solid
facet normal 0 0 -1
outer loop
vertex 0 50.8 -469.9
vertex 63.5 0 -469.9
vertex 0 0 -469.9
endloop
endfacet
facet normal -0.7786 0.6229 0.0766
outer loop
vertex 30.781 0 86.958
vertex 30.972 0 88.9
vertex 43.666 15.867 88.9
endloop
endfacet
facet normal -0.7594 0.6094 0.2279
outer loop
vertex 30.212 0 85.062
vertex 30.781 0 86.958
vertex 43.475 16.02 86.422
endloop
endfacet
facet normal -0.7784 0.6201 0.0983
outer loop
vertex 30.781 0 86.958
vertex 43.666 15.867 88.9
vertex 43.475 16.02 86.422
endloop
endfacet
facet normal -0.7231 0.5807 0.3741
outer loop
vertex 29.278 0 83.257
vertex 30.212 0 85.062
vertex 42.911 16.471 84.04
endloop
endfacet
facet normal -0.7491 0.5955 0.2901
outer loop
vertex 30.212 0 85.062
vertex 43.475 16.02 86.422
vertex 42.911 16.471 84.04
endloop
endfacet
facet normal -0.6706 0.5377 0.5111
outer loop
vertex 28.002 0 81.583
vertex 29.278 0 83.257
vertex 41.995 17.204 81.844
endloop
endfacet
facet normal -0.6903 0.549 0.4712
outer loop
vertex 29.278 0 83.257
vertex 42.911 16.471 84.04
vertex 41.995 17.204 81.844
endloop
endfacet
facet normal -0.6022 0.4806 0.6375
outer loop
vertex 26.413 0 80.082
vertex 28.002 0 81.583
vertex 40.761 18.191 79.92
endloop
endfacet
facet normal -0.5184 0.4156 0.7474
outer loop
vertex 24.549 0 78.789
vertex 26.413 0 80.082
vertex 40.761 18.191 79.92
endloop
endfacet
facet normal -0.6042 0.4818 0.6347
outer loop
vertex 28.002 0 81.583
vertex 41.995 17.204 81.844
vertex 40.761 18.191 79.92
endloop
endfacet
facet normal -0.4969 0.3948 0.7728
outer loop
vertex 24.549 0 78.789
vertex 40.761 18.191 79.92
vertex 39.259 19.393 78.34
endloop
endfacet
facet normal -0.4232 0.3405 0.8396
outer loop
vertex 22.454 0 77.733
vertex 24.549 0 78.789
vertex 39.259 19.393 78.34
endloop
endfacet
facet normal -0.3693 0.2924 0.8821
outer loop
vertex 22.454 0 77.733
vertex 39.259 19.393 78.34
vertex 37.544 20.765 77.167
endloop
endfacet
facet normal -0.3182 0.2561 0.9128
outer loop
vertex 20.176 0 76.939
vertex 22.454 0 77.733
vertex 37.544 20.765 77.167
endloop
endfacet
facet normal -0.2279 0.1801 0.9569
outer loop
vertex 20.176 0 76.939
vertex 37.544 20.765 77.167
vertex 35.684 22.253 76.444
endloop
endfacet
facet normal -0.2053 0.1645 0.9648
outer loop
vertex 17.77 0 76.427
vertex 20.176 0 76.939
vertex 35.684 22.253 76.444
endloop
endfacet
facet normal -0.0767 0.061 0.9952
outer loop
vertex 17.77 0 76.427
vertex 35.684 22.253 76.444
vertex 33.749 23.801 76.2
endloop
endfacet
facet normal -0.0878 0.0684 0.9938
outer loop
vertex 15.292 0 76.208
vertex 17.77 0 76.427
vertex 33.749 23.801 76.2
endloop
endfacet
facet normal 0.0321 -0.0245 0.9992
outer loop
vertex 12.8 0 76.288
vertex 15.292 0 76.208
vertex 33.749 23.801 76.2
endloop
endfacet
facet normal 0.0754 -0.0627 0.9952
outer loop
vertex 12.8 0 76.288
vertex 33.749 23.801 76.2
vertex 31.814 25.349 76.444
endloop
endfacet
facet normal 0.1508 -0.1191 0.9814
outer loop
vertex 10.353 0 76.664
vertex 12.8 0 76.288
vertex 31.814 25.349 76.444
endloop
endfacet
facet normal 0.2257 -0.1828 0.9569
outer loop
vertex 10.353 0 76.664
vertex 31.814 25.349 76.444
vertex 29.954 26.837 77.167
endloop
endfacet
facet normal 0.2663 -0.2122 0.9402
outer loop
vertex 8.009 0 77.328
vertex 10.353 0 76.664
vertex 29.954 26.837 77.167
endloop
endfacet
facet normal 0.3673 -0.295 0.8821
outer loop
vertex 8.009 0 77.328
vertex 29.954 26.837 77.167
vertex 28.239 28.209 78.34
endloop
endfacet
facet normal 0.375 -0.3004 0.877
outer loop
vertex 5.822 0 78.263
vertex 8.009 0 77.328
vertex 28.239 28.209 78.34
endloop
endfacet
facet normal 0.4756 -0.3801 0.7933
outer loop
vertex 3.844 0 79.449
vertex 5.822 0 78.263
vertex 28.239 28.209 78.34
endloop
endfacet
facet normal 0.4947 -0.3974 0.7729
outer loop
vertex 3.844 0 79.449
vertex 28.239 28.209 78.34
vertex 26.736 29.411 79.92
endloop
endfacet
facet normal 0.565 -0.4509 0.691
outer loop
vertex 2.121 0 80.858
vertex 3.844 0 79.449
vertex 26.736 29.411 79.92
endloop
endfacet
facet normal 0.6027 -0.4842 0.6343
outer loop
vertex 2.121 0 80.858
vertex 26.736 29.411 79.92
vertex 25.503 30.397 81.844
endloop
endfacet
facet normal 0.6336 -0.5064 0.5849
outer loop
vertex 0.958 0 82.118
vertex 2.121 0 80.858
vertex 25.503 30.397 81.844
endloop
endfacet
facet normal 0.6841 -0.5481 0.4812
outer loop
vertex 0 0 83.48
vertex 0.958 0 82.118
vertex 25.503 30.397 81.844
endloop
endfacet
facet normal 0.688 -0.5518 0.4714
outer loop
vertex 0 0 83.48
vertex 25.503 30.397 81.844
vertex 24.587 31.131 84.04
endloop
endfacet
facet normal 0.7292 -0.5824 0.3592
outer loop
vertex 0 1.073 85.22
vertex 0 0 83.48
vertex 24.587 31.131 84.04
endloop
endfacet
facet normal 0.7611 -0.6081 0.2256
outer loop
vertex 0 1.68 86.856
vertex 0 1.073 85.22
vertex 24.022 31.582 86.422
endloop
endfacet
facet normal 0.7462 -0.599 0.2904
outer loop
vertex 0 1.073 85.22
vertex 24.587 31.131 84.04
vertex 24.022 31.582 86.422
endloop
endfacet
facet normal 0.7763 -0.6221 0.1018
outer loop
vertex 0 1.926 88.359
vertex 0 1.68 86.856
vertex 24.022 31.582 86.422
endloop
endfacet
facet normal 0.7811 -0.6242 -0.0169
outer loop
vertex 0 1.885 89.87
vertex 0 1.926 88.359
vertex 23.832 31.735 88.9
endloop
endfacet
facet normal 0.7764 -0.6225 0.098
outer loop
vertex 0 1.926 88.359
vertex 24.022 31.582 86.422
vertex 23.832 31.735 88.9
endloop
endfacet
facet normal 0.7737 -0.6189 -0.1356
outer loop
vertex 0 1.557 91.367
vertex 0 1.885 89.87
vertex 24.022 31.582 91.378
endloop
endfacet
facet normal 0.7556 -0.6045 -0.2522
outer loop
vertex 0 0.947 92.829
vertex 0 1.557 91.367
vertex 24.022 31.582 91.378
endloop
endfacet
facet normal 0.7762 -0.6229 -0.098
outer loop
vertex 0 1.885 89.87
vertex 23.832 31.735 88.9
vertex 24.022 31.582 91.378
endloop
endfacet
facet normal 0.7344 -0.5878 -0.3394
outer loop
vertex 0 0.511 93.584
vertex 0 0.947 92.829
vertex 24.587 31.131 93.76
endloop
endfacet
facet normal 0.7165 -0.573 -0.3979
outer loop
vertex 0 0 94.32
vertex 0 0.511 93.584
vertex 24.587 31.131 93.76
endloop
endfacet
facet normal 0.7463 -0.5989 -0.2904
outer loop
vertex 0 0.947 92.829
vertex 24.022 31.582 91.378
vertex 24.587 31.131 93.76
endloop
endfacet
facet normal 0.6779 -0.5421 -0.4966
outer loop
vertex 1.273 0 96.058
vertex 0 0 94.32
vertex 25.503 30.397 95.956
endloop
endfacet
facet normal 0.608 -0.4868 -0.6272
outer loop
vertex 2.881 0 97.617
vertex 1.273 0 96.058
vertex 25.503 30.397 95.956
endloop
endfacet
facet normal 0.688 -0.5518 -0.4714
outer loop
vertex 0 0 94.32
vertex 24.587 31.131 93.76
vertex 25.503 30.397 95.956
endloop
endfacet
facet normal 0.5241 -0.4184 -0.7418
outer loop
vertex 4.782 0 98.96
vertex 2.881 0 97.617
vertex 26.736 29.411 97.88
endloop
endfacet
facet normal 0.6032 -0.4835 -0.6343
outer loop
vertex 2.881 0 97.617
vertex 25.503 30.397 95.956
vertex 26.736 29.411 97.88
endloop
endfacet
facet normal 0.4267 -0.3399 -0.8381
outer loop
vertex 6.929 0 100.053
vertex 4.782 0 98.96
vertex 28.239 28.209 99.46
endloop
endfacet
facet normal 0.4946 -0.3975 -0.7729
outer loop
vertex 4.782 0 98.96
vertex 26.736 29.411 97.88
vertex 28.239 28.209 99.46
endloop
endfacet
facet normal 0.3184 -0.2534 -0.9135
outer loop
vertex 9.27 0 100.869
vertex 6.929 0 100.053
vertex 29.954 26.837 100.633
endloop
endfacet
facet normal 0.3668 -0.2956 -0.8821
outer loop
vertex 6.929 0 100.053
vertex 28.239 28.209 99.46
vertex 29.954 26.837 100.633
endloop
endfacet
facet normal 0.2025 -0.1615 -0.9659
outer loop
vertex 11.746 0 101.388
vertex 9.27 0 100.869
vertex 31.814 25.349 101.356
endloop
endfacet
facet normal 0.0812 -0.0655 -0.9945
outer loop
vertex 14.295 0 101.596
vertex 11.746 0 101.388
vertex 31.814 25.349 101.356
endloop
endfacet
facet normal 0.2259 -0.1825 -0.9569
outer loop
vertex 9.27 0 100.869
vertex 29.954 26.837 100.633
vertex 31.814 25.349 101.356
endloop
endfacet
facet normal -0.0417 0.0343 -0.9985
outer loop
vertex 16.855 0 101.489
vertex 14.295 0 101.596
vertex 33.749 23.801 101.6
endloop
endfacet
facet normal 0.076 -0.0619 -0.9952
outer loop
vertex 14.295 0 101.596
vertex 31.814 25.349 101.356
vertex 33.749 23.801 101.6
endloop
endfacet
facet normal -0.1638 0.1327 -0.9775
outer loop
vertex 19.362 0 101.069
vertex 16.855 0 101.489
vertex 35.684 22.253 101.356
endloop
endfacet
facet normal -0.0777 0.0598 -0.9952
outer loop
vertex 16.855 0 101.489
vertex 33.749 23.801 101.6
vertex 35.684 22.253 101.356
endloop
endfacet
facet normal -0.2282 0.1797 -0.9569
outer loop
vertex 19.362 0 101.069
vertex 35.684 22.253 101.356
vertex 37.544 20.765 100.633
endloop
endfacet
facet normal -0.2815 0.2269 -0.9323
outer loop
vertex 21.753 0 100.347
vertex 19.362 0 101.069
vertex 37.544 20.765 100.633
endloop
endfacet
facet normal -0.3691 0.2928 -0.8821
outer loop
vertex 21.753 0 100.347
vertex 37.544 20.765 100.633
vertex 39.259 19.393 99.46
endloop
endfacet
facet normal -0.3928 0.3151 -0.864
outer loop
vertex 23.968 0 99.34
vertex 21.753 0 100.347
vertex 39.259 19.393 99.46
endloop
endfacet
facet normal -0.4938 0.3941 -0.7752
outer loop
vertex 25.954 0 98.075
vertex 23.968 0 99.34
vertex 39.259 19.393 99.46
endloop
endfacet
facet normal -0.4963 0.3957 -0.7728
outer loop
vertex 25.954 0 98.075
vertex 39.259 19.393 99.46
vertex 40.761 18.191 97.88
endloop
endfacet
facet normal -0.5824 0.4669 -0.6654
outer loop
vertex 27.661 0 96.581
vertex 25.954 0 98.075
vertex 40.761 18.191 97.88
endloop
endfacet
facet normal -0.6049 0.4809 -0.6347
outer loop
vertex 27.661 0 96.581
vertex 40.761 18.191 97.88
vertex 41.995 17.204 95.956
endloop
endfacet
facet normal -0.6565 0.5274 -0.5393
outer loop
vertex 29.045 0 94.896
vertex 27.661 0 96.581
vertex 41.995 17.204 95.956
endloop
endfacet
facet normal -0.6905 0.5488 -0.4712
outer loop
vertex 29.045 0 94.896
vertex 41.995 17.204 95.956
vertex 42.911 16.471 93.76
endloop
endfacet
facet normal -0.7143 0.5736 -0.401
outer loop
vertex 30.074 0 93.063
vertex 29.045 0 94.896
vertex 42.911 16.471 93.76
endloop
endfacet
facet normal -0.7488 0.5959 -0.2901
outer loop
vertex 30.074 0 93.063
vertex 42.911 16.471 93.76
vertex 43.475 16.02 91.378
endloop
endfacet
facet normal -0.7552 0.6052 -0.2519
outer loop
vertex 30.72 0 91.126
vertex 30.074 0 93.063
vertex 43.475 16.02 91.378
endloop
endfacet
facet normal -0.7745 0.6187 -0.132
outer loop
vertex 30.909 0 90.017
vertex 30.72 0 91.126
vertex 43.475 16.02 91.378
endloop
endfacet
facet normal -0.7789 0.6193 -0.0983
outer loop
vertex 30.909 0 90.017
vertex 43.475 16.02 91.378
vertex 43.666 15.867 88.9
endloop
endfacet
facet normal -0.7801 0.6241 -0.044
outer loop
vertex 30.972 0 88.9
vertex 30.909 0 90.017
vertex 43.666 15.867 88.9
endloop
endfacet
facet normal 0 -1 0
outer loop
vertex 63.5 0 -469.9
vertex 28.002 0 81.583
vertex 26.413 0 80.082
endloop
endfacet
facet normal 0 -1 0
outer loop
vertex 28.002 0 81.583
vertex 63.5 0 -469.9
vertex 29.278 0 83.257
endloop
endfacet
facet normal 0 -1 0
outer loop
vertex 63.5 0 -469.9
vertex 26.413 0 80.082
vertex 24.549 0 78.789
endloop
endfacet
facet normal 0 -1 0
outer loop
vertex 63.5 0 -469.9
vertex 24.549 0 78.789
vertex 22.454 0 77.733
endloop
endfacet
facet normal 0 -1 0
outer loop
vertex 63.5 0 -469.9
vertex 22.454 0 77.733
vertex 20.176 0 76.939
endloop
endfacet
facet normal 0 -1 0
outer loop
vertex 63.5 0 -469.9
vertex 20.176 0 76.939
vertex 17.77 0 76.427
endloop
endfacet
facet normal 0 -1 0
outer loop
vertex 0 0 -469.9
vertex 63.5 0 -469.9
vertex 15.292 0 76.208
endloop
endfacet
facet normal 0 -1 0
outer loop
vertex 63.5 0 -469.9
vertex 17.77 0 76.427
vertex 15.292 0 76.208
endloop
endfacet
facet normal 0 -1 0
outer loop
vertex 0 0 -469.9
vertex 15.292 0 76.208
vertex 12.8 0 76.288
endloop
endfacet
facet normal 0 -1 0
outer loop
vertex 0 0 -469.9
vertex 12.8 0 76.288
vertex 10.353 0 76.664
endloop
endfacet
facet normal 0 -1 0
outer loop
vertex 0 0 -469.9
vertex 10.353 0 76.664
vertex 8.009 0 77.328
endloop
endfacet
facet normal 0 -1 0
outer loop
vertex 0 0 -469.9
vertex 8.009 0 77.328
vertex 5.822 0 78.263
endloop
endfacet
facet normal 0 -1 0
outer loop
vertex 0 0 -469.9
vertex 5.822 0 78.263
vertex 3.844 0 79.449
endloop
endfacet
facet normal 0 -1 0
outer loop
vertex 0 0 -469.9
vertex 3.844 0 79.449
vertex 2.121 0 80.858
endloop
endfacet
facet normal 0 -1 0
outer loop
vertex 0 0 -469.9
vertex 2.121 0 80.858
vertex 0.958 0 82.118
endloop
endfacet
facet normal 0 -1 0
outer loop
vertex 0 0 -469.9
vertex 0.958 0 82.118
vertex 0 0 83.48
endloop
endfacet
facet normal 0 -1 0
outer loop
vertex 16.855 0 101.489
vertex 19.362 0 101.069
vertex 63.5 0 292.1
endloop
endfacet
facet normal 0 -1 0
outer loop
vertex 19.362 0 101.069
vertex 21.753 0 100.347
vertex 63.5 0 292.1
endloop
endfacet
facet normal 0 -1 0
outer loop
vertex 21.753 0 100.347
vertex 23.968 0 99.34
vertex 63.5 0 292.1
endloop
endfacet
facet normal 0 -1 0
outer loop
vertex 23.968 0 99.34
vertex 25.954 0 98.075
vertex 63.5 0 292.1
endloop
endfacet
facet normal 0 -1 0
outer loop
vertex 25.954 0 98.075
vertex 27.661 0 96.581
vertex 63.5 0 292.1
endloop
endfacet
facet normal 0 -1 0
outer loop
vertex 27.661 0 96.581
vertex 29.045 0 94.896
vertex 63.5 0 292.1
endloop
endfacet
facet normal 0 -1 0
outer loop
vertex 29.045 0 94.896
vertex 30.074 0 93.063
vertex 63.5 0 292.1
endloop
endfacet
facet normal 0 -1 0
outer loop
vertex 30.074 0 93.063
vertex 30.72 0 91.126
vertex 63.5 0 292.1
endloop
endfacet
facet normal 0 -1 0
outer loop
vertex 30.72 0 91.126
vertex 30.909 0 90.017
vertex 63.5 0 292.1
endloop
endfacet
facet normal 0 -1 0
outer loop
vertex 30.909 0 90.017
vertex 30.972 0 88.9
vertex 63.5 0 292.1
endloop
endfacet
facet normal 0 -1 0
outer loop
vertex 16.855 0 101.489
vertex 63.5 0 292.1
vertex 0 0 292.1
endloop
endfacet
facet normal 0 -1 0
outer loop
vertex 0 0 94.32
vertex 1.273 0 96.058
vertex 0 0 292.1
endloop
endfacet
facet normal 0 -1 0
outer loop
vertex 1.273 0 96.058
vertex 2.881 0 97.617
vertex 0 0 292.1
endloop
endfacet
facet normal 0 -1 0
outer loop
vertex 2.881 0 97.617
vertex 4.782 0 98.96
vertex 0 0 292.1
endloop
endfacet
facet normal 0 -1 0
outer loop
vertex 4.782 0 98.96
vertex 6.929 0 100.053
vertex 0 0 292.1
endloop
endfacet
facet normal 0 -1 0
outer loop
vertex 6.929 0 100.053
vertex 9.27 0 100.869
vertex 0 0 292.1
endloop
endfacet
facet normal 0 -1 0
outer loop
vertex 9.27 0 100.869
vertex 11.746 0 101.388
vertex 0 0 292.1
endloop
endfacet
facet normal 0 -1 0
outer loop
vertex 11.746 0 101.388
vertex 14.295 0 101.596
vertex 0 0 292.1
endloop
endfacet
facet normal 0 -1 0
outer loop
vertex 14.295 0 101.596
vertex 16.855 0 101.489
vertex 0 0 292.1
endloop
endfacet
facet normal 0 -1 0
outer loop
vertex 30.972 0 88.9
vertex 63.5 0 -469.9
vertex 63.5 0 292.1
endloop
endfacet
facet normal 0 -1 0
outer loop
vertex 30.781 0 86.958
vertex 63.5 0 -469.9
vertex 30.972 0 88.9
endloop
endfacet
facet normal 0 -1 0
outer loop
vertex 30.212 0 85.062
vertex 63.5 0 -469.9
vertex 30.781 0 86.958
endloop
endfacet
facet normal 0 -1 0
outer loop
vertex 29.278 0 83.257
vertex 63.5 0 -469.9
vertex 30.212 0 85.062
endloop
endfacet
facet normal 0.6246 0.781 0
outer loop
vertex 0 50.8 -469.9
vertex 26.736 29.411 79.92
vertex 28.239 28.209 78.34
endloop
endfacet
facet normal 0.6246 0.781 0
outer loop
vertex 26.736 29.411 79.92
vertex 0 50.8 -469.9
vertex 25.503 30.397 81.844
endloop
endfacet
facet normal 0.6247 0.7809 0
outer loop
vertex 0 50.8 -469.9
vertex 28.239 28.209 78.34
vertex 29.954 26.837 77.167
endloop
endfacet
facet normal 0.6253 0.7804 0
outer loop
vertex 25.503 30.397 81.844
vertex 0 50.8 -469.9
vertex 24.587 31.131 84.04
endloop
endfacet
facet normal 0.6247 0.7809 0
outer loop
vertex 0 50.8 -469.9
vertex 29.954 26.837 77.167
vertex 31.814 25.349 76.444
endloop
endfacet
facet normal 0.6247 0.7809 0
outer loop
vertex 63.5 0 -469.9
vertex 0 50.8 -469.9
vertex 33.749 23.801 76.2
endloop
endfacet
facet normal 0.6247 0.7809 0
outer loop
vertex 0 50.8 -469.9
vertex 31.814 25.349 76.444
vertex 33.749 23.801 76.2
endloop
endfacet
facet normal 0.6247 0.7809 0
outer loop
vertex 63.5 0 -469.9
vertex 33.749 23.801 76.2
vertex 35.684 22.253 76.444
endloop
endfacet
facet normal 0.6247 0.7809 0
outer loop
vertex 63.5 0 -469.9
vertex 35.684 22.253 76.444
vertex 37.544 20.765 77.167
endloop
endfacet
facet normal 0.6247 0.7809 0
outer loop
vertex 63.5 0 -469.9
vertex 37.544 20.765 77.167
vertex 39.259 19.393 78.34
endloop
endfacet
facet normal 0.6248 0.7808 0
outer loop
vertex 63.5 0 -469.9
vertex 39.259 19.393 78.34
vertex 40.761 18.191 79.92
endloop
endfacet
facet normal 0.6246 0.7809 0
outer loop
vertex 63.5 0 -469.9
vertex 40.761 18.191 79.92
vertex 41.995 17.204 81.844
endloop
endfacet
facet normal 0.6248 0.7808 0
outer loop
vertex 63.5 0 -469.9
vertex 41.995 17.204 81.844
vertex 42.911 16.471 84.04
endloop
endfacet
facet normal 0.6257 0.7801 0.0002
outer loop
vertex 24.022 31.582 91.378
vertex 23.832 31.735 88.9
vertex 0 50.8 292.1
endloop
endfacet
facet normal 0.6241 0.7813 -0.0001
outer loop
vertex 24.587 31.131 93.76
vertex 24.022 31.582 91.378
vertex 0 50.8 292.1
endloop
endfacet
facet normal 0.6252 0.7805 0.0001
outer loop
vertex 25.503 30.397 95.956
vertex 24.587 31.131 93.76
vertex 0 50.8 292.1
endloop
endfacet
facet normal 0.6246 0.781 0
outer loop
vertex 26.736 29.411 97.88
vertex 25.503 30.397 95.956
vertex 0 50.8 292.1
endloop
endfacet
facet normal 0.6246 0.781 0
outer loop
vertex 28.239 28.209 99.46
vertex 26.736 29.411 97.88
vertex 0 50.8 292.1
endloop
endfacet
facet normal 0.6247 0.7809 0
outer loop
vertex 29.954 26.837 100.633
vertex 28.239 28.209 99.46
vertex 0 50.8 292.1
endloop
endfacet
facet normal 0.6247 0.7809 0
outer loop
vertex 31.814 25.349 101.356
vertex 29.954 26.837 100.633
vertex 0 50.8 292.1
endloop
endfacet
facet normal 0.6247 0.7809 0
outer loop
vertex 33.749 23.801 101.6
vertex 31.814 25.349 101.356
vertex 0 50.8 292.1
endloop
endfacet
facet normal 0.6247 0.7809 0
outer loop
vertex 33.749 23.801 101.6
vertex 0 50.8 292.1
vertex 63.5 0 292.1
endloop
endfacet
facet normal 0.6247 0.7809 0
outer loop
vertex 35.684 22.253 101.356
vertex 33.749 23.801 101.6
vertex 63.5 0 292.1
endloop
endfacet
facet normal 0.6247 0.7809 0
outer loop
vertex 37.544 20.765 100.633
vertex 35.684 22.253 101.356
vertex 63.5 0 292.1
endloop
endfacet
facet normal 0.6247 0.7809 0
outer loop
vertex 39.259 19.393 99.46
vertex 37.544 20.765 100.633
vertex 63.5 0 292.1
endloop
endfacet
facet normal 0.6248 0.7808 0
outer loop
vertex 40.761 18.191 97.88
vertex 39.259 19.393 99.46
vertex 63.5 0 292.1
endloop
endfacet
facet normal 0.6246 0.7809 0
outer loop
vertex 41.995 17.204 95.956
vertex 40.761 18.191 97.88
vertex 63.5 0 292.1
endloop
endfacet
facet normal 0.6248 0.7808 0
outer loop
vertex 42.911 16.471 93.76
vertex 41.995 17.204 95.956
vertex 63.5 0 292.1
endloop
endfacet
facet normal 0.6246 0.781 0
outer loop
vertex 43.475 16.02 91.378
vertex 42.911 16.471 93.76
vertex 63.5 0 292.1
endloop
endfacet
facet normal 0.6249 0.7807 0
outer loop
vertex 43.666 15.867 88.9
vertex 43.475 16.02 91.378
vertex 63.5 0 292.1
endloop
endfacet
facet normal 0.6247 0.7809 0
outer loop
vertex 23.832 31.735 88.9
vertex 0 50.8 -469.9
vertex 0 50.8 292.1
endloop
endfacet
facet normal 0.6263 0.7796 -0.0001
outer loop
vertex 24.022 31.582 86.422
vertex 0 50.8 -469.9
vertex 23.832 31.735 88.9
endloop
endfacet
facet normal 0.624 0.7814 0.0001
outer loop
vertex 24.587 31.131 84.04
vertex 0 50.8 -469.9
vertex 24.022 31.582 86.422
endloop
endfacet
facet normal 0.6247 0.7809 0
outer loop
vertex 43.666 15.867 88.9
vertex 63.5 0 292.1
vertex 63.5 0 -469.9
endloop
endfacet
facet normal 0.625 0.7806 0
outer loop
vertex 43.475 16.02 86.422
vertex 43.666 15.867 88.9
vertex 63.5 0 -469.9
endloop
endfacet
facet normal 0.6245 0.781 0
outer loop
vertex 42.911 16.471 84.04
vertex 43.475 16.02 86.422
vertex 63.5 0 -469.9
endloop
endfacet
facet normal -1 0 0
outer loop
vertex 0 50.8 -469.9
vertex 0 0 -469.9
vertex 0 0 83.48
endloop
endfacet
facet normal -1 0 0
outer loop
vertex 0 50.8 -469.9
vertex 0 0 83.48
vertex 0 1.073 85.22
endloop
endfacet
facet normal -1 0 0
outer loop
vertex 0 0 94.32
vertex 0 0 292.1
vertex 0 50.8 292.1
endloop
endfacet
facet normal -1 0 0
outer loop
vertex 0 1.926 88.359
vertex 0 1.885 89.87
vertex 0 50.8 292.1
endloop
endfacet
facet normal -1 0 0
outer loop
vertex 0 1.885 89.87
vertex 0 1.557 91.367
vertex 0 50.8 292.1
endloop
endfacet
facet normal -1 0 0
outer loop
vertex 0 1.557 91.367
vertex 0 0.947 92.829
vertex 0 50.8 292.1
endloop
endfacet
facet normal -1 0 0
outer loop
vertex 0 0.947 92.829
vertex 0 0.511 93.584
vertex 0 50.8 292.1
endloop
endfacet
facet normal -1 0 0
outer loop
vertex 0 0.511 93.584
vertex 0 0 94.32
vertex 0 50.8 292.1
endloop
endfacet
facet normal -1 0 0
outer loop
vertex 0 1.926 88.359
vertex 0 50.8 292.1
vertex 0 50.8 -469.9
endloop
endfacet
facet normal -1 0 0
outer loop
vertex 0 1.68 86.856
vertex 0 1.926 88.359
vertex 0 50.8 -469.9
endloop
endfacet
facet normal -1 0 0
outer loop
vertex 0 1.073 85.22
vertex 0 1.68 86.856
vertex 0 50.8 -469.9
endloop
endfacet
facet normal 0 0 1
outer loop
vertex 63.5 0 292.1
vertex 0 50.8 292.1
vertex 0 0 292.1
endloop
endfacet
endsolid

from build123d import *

# Parameters (mm, degrees)
BOSS_EXTRUDE1_DEPTH = 38.1
BOSS_EXTRUDE2_DEPTH = 292.1
BOSS_EXTRUDE3_DEPTH = 431.8
SKETCH6_R           = 12.7
CUT_EXTRUDE2_DEPTH  = 431.8


with BuildPart() as part:
    # Sketch1 → Boss-Extrude1 (new body)
    with BuildSketch(Plane.XY):
        Polygon((0, 0), (0, 50.8), (63.5, 0), align=None)
    extrude(amount=-BOSS_EXTRUDE1_DEPTH)

    # Sketch3 → Boss-Extrude2 (add)
    with BuildSketch(Plane.XY):
        Polygon((0, 50.8), (0, 0), (63.5, 0), align=None)
    extrude(amount=BOSS_EXTRUDE2_DEPTH)

    # Sketch4 → Boss-Extrude3 (add)
    with BuildSketch(Plane(origin=(0, 0, -38.1), x_dir=(-1, 0, 0), z_dir=(0, 0, -1))):
        Polygon((0, 50.8), (-63.5, 0), (0, 0), align=None)
    extrude(amount=BOSS_EXTRUDE3_DEPTH)

    # Sketch6 → Cut-Extrude2 (cut)
    with BuildSketch(Plane(origin=(24.780487805, 30.975609756, 0), x_dir=(0.780868809, -0.624695048, 0), z_dir=(0.624695048, 0.780868809, 0))):
        with Locations((11.4851694, -88.9)):
            Circle(SKETCH6_R)
    extrude(amount=-CUT_EXTRUDE2_DEPTH, mode=Mode.SUBTRACT)


solid = part.part
